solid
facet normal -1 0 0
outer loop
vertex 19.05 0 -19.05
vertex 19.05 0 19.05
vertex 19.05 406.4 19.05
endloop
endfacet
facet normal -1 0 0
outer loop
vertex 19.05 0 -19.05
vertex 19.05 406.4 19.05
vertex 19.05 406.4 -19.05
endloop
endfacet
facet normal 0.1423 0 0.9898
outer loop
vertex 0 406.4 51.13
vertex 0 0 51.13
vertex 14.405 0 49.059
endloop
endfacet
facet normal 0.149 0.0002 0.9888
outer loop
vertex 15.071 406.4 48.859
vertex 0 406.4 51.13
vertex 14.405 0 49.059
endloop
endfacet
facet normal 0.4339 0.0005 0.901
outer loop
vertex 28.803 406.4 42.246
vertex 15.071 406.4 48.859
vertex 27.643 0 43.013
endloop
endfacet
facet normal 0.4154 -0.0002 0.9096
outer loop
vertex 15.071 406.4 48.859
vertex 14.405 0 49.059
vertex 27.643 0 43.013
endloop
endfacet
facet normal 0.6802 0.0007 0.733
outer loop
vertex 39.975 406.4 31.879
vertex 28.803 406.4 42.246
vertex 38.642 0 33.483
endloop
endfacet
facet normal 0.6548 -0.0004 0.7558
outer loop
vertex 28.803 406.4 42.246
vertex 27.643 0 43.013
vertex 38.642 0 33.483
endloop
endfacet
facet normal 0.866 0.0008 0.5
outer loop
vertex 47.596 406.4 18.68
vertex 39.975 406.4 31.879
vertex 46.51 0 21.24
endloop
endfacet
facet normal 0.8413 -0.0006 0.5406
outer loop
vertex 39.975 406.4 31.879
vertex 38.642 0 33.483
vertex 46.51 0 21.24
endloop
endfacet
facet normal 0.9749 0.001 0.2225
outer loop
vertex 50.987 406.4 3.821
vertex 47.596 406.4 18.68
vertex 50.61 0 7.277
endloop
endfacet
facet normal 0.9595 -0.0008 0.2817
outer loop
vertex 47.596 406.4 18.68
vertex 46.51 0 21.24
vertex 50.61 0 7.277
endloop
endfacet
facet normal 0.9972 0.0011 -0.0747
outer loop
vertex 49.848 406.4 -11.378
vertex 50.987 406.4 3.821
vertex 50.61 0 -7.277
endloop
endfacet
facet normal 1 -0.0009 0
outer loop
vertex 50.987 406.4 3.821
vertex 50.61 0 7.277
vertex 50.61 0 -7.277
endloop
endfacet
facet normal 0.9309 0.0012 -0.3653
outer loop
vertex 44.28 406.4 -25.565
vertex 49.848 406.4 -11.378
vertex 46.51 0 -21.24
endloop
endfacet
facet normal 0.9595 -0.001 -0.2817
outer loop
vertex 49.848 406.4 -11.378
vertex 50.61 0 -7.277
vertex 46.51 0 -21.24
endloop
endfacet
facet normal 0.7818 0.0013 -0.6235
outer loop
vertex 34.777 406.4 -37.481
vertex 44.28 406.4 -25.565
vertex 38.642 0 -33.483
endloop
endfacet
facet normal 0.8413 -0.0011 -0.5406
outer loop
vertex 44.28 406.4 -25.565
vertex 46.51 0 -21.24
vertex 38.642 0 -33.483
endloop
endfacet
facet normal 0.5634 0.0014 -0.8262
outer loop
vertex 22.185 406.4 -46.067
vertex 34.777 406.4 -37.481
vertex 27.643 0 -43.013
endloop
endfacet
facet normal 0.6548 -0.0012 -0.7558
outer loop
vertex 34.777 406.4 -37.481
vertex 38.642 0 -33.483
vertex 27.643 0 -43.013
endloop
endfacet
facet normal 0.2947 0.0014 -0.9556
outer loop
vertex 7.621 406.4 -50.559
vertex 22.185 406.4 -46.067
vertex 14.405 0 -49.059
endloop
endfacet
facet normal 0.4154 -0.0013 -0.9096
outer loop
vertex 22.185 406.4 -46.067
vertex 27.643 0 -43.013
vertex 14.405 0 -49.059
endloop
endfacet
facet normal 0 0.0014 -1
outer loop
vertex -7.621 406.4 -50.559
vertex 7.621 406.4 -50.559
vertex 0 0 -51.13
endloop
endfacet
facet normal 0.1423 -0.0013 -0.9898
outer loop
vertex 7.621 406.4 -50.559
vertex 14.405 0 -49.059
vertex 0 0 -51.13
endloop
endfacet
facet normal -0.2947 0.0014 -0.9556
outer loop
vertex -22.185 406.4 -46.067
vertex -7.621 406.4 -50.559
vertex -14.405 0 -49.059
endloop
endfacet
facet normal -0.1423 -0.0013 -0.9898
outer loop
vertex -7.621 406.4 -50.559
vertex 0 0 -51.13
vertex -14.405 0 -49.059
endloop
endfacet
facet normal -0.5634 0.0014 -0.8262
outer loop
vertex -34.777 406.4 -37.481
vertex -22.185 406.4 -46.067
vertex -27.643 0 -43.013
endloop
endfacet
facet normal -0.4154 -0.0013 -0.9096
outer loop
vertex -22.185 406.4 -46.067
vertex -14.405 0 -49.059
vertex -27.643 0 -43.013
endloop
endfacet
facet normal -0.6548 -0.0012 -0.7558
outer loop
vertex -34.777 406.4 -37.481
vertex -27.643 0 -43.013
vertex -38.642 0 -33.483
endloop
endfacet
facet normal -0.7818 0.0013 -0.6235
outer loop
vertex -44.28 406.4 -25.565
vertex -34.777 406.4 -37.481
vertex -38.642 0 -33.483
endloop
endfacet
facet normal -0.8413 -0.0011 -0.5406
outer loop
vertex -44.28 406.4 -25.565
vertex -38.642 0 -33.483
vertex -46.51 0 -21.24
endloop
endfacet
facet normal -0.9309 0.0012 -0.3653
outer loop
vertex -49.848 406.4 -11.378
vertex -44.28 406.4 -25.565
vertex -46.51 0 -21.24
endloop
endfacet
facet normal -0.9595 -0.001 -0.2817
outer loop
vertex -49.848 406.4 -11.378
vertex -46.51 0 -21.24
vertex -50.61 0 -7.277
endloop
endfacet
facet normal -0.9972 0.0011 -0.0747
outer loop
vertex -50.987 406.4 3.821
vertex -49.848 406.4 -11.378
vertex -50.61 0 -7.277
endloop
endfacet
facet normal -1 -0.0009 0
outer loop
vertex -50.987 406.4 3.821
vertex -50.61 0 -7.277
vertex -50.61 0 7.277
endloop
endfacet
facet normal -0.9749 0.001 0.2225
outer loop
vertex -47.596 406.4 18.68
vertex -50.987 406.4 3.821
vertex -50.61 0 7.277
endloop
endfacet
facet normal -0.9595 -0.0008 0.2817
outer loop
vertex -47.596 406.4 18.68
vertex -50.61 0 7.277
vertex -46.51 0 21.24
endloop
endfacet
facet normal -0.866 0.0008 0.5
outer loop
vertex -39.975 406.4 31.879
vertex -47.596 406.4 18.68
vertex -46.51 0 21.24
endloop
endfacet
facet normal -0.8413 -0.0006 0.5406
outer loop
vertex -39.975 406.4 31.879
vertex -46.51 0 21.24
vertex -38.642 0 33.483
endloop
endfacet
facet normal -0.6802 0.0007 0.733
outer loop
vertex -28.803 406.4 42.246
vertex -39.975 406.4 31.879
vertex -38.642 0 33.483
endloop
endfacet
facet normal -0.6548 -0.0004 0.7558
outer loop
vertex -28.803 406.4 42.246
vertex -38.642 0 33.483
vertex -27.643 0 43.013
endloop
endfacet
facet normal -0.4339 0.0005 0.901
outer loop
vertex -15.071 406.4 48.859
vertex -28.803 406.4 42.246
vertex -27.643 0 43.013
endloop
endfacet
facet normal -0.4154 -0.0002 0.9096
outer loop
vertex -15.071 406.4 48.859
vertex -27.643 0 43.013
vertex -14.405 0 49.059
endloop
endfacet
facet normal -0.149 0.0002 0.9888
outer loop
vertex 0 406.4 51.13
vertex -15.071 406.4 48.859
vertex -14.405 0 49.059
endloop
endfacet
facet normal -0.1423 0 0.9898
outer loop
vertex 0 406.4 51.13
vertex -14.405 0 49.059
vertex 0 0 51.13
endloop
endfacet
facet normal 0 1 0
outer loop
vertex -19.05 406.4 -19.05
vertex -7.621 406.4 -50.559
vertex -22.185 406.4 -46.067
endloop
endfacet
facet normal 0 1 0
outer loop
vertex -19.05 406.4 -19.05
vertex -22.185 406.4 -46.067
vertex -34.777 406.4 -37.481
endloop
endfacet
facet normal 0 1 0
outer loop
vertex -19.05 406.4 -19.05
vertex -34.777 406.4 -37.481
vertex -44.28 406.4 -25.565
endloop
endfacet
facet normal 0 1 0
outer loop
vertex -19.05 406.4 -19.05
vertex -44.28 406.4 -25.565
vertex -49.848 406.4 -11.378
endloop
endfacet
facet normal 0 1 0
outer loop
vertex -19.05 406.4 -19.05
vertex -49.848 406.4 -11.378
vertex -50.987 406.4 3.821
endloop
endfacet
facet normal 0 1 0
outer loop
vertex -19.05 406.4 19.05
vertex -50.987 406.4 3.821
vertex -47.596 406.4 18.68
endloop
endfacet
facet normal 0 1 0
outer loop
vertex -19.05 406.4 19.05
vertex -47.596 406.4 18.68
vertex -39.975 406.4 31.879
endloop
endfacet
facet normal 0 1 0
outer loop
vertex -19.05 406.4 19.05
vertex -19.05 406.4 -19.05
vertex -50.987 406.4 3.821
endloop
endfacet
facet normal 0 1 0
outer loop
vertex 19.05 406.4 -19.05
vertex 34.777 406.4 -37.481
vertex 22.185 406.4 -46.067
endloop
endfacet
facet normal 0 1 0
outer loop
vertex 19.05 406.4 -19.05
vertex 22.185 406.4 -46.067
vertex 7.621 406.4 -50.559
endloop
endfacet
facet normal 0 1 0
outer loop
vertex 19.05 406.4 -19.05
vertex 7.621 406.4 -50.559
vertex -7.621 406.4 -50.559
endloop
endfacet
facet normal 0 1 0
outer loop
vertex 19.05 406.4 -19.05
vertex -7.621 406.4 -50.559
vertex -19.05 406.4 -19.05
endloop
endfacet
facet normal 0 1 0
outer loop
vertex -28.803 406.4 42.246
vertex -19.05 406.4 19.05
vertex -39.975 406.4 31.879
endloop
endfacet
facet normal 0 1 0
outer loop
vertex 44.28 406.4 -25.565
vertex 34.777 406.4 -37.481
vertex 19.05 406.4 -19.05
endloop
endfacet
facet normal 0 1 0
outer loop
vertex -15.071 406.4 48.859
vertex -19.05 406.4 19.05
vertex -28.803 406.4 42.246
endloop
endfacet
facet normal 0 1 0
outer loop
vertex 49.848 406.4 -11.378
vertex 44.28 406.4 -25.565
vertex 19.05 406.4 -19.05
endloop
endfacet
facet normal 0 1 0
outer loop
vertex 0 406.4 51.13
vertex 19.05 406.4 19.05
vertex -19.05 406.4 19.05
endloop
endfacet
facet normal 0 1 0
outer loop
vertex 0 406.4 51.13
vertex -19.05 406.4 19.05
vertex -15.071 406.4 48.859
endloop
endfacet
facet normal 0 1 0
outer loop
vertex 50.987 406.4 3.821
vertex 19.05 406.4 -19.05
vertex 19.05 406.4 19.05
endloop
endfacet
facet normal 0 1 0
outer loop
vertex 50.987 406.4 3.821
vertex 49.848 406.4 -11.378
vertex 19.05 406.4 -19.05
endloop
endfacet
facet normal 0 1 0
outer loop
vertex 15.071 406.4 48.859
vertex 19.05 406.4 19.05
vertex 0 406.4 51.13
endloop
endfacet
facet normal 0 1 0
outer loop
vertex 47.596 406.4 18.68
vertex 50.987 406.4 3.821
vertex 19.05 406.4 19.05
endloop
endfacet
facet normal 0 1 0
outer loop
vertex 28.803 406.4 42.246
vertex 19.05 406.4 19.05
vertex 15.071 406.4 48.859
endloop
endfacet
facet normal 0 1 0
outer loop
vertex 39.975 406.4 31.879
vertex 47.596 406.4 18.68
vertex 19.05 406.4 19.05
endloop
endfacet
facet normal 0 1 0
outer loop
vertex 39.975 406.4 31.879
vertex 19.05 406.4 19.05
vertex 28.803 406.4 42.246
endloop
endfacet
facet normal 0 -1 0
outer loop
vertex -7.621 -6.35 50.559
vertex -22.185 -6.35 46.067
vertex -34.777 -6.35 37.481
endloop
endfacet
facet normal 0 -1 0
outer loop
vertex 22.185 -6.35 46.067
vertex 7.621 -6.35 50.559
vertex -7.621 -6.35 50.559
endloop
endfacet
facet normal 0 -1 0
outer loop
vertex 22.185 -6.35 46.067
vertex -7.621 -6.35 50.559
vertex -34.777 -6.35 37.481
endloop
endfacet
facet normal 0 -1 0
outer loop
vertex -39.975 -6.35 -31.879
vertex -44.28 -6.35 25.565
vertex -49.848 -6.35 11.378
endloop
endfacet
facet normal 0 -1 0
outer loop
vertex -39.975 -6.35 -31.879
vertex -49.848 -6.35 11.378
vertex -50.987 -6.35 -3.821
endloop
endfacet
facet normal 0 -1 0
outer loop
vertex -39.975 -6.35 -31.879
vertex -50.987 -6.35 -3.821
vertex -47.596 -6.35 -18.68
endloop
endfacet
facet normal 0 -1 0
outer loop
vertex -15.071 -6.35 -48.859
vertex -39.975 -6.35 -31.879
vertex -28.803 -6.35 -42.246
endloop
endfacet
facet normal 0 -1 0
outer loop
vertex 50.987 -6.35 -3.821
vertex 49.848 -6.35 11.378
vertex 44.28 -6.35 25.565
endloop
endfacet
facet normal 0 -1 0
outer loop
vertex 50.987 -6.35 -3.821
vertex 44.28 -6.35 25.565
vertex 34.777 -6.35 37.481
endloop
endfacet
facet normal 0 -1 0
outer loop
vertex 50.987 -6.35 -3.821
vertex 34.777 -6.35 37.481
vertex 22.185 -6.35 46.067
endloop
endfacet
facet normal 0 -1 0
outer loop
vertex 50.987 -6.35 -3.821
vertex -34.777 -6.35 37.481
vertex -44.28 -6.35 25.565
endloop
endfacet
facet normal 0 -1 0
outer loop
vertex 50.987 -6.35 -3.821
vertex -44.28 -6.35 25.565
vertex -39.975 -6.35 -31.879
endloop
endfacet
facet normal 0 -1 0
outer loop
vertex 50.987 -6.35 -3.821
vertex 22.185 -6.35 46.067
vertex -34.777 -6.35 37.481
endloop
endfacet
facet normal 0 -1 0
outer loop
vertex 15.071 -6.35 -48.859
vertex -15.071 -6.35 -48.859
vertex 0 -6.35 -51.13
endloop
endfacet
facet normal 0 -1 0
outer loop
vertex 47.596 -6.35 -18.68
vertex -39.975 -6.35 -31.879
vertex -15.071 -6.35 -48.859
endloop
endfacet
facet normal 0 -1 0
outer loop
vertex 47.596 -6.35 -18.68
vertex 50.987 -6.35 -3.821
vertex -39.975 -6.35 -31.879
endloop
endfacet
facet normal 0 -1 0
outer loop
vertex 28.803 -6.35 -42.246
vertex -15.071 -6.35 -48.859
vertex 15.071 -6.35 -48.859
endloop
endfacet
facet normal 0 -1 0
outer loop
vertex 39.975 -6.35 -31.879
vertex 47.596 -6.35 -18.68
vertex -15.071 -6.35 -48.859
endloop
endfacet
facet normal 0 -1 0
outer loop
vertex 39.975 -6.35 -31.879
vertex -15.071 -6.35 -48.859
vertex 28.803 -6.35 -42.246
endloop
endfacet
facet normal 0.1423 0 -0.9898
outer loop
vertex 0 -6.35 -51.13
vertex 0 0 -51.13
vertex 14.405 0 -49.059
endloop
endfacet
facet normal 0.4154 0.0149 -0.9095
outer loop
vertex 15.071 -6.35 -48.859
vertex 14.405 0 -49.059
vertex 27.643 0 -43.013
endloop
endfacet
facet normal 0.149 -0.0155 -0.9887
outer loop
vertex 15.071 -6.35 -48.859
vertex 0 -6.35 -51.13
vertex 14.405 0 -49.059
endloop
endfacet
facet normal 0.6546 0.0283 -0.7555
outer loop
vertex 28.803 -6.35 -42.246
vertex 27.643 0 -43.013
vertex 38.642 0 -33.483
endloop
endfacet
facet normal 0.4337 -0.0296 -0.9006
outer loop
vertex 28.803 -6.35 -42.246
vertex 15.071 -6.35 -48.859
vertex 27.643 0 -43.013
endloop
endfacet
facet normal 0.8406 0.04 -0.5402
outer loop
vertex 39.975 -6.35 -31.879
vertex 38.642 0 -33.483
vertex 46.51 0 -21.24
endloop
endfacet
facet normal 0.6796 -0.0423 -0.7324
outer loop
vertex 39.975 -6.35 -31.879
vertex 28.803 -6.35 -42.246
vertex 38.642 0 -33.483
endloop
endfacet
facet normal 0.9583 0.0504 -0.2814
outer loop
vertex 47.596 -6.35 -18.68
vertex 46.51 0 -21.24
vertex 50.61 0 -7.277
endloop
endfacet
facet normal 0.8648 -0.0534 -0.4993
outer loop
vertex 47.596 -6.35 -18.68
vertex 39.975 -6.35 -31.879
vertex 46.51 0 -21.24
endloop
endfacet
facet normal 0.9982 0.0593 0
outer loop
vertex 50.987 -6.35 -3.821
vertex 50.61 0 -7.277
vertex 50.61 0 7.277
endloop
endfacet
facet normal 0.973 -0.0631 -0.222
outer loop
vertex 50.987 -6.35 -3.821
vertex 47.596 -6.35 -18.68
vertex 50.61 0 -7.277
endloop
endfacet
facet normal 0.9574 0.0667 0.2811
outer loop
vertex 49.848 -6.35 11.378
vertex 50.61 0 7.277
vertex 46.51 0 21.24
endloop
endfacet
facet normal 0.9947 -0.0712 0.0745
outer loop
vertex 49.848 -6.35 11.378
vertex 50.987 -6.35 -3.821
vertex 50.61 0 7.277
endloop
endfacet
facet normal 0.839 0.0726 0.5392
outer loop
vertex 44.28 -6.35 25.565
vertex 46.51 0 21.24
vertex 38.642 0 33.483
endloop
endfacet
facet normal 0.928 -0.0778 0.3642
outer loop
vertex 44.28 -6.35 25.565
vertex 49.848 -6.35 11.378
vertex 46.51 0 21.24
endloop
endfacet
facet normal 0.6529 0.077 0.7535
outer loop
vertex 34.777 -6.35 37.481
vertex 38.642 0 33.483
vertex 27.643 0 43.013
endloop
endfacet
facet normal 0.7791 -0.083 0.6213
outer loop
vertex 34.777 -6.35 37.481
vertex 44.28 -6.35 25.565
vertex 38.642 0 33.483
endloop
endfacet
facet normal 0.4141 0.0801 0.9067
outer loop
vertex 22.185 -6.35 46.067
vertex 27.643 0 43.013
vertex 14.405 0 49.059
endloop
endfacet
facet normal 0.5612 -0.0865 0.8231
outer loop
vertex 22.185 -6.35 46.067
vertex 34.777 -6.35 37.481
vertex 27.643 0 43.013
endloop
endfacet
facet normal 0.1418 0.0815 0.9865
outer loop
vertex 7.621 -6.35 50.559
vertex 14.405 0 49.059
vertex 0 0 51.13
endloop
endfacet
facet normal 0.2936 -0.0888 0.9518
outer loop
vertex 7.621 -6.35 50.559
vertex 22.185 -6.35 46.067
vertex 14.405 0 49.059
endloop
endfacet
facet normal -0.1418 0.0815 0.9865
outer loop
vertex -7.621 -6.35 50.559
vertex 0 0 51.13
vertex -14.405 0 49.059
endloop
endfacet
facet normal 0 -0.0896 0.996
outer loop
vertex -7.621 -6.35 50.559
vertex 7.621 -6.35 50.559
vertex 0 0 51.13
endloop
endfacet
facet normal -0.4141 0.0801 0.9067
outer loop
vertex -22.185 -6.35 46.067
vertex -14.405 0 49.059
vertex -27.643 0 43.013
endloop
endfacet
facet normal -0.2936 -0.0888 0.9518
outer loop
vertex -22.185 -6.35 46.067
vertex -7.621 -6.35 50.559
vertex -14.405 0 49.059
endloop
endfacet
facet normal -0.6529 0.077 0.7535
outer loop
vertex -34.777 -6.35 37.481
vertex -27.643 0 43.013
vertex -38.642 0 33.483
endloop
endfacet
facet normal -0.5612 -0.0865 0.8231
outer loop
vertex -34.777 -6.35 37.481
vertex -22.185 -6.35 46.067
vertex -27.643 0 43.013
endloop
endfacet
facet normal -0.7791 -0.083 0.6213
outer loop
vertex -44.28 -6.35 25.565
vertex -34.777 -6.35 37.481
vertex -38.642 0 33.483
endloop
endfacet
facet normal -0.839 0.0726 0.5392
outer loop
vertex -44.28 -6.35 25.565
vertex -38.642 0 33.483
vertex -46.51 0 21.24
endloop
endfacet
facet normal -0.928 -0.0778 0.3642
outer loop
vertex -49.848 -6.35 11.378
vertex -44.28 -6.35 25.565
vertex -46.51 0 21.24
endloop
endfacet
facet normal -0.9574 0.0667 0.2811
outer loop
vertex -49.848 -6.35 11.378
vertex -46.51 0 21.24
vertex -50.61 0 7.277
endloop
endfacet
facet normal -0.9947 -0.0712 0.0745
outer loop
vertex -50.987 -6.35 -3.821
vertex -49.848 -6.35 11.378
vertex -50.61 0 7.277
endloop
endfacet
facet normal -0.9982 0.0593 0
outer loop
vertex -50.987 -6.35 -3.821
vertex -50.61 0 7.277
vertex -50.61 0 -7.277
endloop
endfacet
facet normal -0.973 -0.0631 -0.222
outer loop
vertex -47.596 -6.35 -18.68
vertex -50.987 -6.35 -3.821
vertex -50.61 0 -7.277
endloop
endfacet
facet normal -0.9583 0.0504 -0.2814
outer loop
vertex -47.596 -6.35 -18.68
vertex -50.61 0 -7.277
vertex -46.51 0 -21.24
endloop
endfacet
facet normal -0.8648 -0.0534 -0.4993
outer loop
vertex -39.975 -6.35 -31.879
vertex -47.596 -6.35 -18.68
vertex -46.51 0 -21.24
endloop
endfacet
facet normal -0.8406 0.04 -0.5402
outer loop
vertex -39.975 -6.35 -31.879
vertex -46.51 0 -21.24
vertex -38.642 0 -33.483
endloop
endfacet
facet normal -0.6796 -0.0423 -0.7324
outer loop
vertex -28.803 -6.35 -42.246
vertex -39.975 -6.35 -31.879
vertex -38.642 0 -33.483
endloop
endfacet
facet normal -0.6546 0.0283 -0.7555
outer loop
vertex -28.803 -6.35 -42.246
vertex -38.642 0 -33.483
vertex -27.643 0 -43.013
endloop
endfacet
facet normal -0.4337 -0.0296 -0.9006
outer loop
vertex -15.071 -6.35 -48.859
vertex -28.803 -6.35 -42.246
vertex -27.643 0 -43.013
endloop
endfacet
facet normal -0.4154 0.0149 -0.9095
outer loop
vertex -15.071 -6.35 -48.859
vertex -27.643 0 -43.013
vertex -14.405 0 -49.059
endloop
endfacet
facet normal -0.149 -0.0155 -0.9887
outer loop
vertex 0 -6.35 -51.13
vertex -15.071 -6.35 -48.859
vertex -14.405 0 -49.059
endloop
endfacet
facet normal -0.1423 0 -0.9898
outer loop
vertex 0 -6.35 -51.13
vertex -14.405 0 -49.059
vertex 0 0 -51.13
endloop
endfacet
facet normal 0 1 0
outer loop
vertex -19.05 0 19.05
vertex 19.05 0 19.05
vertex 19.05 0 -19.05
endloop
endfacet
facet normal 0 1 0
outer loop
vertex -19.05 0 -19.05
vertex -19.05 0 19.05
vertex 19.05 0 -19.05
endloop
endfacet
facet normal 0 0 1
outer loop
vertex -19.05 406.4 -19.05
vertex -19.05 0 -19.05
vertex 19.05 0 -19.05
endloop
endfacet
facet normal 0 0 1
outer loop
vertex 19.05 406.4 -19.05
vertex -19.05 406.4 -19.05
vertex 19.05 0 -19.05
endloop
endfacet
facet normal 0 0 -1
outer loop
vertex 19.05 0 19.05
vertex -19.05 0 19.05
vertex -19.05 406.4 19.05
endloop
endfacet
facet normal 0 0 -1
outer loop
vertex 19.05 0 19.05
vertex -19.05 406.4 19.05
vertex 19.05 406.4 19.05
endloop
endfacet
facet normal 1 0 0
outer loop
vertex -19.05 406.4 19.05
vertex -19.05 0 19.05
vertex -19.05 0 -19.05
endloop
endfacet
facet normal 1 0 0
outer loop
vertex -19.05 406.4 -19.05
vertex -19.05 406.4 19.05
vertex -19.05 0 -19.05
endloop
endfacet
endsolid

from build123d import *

# Parameters (mm, degrees)
SKETCH1_R           = 51.1302
SKETCH1_W           = 38.1
SKETCH1_H           = 38.1
BOSS_EXTRUDE1_DEPTH = 406.4
BOSS_EXTRUDE2_START = 6.35
SKETCH2_R           = 51.1302
BOSS_EXTRUDE2_DEPTH = 6.35


with BuildPart() as part:
    # Sketch1 → Boss-Extrude1 (new body)
    with BuildSketch(Plane(origin=(0, 0, 0), x_dir=(1, 0, 0), z_dir=(0, 1, 0))):
        with Locations(Location((0, 0, 0), (0, 0, 270))):
            Circle(SKETCH1_R)
        Rectangle(SKETCH1_W, SKETCH1_H, mode=Mode.SUBTRACT)
    extrude(amount=BOSS_EXTRUDE1_DEPTH)

    # Sketch2 → Boss-Extrude2 (add)
    with BuildSketch(Plane.XZ.offset(BOSS_EXTRUDE2_START)):
        with Locations(Location((0, 0, 0), (0, 0, 270))):
            Circle(SKETCH2_R)
    extrude(amount=-BOSS_EXTRUDE2_DEPTH)


solid = part.part
